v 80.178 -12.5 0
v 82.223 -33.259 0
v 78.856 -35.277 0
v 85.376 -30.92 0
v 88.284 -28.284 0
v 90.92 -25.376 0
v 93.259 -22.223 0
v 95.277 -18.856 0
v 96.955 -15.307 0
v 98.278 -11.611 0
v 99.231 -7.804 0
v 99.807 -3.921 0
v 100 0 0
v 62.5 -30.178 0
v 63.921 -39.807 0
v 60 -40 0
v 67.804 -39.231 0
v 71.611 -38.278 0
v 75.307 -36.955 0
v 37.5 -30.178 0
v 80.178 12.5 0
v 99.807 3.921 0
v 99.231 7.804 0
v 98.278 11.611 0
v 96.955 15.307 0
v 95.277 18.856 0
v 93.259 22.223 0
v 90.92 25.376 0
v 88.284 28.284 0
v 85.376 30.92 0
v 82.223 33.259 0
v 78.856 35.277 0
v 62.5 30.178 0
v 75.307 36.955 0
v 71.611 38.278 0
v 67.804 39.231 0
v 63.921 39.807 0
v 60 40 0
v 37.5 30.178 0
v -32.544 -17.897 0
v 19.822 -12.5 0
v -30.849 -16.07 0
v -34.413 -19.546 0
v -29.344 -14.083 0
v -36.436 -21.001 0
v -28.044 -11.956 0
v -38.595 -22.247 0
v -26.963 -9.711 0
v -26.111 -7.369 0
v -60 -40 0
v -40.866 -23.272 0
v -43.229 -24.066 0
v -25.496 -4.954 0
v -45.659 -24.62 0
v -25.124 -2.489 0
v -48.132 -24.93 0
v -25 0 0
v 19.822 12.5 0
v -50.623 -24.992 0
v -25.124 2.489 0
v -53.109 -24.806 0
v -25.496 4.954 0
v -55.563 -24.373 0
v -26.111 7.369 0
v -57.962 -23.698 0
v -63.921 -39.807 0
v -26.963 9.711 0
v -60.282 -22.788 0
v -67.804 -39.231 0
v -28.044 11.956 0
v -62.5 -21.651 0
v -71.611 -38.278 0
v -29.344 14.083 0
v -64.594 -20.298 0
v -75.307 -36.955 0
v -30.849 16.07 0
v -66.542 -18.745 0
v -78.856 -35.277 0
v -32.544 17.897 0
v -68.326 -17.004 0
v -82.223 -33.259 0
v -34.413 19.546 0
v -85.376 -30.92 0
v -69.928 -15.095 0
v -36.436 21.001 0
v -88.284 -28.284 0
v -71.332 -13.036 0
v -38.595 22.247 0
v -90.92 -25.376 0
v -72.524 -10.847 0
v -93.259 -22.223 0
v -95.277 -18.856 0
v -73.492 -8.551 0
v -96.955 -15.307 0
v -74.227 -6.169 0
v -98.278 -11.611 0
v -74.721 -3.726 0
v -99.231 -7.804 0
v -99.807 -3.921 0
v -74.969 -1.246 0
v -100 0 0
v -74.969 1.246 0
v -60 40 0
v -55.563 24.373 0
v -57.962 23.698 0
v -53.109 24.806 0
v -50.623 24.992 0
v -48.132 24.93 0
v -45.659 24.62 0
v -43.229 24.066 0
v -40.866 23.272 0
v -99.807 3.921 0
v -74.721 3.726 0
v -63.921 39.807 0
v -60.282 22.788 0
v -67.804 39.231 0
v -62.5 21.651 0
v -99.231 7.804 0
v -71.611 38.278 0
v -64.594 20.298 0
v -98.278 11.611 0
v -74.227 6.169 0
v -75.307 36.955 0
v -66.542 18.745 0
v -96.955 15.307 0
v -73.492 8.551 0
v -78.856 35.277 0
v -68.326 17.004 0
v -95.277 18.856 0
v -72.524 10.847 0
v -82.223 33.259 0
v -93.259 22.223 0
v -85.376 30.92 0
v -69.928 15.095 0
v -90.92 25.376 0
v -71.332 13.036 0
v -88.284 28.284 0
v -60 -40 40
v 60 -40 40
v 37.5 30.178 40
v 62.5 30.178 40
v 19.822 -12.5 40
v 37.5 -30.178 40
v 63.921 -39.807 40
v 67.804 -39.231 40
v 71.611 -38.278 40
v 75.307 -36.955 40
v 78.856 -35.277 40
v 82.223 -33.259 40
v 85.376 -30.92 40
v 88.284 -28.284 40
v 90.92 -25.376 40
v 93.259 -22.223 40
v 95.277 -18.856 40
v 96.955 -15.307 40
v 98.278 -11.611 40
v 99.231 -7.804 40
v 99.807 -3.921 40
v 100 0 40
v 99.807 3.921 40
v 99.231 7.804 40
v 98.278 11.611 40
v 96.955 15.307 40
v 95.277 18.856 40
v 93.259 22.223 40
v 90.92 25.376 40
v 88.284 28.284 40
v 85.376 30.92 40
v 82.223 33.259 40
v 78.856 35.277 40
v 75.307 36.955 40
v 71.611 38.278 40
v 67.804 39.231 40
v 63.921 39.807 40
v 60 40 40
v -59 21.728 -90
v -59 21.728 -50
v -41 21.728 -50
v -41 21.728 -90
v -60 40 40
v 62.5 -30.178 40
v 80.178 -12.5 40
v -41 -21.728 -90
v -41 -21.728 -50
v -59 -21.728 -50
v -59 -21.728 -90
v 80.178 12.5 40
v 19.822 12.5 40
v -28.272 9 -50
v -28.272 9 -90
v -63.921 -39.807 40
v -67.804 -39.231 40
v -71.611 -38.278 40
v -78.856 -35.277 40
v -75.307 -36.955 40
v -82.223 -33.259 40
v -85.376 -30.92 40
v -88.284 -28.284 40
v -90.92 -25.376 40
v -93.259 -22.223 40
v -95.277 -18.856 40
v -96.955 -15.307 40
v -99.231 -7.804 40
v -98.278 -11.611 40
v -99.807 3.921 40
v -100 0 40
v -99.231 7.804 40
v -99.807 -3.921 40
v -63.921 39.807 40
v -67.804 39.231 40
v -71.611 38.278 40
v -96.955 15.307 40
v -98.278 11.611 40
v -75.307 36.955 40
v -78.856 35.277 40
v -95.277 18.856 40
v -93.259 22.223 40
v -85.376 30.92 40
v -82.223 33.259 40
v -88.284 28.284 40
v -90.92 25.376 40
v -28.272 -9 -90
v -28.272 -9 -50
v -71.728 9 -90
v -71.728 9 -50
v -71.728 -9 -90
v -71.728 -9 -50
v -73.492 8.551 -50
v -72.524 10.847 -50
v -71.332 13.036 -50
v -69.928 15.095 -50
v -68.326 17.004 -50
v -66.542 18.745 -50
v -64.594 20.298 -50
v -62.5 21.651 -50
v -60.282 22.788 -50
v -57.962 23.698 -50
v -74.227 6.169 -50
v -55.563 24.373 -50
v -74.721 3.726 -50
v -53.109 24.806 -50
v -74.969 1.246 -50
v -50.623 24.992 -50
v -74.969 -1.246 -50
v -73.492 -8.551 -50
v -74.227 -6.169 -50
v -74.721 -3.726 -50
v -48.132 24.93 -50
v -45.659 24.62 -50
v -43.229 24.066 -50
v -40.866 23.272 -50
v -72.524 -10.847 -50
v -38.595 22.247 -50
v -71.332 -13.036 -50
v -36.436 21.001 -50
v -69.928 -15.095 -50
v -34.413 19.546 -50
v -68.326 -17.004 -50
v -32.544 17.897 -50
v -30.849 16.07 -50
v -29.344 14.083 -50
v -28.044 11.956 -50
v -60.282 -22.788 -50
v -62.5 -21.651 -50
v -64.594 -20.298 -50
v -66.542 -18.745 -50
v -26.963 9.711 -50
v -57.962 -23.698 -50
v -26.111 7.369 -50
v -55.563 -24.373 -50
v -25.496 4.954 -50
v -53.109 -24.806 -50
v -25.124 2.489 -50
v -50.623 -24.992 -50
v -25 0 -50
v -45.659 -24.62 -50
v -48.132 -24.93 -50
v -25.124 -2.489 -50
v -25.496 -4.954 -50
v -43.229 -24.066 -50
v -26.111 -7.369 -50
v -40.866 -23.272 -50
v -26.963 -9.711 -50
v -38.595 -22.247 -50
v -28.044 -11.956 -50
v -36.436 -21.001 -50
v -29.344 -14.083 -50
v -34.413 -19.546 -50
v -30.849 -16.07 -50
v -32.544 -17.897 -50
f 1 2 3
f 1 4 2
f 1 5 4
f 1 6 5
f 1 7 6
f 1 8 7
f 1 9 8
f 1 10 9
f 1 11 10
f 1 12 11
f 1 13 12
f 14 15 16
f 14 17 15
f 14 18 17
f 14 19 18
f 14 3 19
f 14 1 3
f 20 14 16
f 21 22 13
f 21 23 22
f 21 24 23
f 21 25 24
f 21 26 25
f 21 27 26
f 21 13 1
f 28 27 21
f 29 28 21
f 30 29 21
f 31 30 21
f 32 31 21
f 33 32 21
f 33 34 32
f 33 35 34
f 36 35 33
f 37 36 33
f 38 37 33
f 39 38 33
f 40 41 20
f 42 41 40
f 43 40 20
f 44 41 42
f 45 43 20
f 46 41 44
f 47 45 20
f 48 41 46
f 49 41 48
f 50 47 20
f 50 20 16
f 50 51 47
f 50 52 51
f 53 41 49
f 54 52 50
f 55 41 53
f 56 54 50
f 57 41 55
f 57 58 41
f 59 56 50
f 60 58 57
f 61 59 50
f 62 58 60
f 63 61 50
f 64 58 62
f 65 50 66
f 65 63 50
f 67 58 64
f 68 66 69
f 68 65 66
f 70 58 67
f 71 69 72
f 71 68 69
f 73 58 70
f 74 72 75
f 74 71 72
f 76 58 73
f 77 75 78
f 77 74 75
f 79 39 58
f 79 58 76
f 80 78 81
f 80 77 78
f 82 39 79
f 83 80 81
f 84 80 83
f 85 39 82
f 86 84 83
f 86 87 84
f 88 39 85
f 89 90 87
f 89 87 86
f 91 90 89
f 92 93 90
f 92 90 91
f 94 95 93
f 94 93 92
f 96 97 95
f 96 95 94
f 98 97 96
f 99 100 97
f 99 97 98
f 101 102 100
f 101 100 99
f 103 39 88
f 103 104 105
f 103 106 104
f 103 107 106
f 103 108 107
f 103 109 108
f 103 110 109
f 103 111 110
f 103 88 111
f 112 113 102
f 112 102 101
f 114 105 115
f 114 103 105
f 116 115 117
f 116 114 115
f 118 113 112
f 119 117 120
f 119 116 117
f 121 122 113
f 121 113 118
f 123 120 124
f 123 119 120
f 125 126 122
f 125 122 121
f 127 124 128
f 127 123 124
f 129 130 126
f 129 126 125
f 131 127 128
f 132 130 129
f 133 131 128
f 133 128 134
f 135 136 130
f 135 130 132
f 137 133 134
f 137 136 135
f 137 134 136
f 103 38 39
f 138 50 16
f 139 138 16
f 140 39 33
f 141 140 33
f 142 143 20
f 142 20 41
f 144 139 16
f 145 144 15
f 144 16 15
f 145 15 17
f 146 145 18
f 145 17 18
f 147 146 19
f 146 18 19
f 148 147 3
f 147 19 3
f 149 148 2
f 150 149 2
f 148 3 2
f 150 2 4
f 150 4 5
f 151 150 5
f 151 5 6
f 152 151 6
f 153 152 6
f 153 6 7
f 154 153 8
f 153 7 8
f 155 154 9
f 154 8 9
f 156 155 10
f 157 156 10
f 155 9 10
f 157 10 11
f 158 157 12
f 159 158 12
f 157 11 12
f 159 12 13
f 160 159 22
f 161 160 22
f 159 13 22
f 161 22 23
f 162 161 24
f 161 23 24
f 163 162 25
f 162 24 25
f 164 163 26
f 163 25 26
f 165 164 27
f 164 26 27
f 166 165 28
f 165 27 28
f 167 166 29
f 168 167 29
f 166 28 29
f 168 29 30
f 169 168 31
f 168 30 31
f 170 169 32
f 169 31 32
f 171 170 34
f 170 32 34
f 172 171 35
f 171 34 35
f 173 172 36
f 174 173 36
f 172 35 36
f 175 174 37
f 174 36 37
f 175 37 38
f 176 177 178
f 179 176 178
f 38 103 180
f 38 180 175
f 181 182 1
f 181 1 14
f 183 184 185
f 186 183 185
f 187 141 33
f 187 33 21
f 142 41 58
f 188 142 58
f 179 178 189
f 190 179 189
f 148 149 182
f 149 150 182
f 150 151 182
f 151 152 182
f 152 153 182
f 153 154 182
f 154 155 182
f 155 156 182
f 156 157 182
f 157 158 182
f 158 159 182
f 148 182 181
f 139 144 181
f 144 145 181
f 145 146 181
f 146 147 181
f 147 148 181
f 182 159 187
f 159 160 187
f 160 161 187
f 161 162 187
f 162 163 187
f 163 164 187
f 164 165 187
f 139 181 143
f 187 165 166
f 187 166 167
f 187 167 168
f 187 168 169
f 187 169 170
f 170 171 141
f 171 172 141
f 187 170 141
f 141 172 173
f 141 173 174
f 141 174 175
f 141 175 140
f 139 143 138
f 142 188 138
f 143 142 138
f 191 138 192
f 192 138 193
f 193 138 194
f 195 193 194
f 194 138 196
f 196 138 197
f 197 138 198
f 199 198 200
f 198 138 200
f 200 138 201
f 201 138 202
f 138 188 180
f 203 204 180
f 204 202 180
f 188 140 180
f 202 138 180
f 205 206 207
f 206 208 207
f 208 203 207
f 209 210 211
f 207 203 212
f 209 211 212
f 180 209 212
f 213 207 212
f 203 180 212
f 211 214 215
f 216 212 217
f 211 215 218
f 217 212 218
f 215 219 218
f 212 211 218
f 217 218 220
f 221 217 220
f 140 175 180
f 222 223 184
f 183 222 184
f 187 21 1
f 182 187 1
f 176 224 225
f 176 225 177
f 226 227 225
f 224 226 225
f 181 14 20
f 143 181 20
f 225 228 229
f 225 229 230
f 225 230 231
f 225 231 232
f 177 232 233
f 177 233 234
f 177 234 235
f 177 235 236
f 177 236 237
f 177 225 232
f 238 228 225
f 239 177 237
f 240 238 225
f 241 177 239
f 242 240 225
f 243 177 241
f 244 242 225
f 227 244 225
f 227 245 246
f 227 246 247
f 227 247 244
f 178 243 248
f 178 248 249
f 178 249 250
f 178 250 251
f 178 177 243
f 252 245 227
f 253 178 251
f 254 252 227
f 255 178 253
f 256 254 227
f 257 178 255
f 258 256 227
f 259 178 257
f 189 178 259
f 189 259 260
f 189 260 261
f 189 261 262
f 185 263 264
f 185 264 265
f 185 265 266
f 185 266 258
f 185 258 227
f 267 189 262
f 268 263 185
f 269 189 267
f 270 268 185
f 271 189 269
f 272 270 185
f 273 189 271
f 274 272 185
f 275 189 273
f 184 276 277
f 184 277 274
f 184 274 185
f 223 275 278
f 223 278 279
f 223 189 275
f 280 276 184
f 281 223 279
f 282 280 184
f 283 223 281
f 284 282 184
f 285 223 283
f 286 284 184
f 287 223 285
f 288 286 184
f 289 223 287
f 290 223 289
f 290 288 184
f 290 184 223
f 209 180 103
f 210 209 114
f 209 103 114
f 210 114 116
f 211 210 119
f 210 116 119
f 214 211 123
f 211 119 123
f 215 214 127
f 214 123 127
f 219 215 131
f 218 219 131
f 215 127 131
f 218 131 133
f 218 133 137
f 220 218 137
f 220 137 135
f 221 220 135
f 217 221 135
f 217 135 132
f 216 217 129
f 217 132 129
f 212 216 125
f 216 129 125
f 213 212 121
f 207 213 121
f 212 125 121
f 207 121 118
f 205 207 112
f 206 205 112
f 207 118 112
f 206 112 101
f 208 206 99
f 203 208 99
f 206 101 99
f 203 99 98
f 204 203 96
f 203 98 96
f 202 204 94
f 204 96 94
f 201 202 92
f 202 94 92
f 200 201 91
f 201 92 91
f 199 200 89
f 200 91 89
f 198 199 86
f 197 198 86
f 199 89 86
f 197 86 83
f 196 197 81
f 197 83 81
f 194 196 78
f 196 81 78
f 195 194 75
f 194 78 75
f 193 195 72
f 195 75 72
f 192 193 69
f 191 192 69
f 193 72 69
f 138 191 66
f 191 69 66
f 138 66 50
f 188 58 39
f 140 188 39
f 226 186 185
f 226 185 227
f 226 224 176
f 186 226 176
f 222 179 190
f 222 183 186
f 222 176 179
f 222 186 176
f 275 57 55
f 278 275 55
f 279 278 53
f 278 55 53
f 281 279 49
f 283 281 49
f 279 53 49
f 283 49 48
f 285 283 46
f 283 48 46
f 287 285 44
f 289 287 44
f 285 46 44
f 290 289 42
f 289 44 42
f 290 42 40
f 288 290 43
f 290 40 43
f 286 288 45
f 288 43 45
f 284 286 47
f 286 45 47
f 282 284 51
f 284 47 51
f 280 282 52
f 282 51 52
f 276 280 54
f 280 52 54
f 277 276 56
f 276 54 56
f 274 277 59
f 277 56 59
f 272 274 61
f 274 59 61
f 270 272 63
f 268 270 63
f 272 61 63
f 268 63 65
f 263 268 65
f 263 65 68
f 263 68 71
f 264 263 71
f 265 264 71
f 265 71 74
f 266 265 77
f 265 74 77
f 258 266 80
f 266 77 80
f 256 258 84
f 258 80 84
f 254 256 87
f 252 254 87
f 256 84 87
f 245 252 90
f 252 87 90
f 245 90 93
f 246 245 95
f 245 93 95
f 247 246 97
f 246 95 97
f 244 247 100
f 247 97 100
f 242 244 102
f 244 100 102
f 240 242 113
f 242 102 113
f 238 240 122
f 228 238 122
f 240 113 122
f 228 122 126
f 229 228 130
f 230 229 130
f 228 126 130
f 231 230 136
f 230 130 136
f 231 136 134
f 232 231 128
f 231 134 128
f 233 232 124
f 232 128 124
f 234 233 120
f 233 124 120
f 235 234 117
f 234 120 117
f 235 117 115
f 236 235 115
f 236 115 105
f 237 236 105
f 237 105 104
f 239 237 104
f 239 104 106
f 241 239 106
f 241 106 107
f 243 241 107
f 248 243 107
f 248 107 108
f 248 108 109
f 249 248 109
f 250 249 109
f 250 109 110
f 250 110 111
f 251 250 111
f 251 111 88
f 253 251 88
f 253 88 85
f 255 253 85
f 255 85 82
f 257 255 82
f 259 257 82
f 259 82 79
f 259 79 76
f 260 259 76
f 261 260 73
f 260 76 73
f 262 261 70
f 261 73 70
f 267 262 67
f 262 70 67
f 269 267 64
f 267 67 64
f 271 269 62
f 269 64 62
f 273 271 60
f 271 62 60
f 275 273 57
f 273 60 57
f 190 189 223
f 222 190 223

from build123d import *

# Parameters (mm, degrees)
PAD_DEPTH    = 40
POCKET_DEPTH = 100
SKETCH002_R  = 25
PAD001_DEPTH = 50
PAD002_DEPTH = 40


with BuildPart() as part:
    # Sketch → Pad (new body)
    with BuildSketch(Plane.XY):
        with BuildLine():
            Line((-60, 40), (60, 40))
            ThreePointArc((60, -40), (100, 0), (60, 40))
            Line((-60, -40), (60, -40))
            ThreePointArc((-60, 40), (-100, 0), (-60, -40))
        make_face()
    extrude(amount=PAD_DEPTH)

    # Sketch001 → Pocket (cut)
    with BuildSketch(Plane(origin=(0, 0, 0), x_dir=(1, 0, 0), z_dir=(0, 0, -1))):
        Polygon((62.5, -30.17767), (80.17767, -12.5), (80.17767, 12.5), (62.5, 30.17767), (37.5, 30.17767), (19.82233, 12.5), (19.82233, -12.5), (37.5, -30.17767), align=None)
    extrude(amount=-POCKET_DEPTH, mode=Mode.SUBTRACT)

    # Sketch002 → Pad001 (join)
    with BuildSketch(Plane(origin=(0, 0, 0), x_dir=(1, 0, 0), z_dir=(0, 0, -1))):
        with Locations((-50, 0)):
            Circle(SKETCH002_R)
    extrude(amount=PAD001_DEPTH)

    # Sketch003 → Pad002 (join)
    with BuildSketch(Plane(origin=(0, 0, -50), x_dir=(1, 0, 0), z_dir=(0, 0, -1))):
        Polygon((-41, -21.727922), (-28.272078, -9), (-28.272078, 9), (-41, 21.727922), (-59, 21.727922), (-71.727922, 9), (-71.727922, -9), (-59, -21.727922), align=None)
    extrude(amount=PAD002_DEPTH)


solid = part.part
